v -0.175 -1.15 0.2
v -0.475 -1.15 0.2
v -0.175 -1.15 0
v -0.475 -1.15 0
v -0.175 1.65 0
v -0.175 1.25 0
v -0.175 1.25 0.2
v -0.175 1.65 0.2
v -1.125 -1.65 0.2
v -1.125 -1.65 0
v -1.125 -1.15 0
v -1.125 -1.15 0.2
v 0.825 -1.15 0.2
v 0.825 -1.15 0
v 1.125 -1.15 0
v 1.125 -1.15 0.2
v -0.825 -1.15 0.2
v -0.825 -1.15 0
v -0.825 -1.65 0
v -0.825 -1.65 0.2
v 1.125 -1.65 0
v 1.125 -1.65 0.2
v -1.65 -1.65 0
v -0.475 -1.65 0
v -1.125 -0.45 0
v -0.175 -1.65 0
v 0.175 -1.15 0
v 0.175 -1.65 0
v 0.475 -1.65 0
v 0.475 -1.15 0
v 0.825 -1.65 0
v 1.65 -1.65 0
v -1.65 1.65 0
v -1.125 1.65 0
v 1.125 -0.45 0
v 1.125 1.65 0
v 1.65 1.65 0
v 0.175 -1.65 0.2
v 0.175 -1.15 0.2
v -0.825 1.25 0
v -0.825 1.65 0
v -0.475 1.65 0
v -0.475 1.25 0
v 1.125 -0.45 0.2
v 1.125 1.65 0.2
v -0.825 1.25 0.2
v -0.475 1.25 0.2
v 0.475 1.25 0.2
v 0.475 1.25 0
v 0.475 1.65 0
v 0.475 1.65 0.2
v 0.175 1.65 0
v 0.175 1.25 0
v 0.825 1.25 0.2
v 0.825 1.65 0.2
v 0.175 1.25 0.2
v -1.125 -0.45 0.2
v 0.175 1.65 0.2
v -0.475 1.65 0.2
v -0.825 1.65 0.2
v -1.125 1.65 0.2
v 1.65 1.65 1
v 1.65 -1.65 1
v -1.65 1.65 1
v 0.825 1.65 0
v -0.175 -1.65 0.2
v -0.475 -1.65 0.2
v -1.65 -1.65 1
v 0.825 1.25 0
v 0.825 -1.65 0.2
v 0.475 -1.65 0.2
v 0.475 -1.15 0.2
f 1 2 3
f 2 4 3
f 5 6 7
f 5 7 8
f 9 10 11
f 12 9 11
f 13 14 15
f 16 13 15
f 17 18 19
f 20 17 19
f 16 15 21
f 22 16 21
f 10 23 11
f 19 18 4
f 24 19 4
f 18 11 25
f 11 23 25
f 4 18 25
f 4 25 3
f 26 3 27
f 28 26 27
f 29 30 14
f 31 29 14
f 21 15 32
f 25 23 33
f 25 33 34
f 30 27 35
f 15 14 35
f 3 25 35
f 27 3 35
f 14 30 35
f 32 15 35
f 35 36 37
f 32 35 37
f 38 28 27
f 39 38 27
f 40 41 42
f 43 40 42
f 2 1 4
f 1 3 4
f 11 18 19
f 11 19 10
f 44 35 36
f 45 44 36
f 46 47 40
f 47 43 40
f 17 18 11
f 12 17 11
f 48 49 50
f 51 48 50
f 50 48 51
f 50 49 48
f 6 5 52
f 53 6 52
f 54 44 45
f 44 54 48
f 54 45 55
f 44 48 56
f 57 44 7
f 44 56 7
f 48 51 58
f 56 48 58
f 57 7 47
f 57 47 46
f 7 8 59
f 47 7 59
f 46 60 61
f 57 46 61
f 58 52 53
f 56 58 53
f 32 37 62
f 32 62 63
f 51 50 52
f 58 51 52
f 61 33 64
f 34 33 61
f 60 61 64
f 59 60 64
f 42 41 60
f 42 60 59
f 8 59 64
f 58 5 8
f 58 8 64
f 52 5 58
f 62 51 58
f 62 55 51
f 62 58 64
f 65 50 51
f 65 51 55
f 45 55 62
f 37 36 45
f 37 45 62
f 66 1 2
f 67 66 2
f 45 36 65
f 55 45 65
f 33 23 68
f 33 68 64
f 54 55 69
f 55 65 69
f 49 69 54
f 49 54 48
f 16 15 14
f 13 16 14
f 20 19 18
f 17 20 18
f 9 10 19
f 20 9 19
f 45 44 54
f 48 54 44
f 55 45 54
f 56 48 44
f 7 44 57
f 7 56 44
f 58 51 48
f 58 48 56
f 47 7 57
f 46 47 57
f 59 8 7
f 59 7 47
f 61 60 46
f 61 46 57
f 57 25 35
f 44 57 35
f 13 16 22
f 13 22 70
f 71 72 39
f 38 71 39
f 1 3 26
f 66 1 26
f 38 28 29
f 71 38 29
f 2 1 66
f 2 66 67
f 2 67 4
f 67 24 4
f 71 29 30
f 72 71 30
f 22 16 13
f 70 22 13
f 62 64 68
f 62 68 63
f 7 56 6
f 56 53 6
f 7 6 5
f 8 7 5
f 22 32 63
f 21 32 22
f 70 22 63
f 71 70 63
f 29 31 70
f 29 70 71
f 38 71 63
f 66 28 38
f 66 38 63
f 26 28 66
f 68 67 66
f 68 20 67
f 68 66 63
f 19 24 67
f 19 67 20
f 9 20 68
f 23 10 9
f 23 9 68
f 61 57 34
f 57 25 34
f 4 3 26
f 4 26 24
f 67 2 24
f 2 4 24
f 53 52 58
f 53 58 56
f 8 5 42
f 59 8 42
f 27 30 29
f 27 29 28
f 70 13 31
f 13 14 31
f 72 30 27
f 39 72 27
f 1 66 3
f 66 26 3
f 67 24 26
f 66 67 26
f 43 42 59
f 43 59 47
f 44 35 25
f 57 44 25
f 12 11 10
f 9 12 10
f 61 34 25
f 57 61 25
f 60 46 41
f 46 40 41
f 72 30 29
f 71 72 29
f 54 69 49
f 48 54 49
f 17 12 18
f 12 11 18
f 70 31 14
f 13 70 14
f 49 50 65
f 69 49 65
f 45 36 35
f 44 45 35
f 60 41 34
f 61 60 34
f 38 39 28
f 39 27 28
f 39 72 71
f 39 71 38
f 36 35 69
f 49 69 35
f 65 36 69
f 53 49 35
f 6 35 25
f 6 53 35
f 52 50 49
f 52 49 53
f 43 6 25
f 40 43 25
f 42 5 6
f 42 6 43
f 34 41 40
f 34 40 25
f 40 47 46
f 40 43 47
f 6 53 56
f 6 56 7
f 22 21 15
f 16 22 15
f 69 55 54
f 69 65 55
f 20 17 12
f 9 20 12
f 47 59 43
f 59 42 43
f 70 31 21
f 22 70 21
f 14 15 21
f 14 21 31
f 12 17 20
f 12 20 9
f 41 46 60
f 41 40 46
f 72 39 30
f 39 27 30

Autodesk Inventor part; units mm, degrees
ref_plane "YZ Plane" through (0, 0, 0) normal (1, 0, 0) x (0, 1, 0)
ref_plane "XZ Plane" through (0, 0, 0) normal (0, 1, 0) x (-1, 0, 0)
ref_plane "XY Plane" through (0, 0, 0) normal (0, 0, 1) x (1, 0, 0)
sketch "Sketch1" plane through (0, 0, 0) normal (0, 0, 1) x (1, 0, 0)
  line L0 (1.65, -1.65) -> (-1.65, -1.65)
  line L1 (-1.65, -1.65) -> (-1.65, 1.65)
  line L2 (-1.65, 1.65) -> (1.65, 1.65)
  line L3 (1.65, 1.65) -> (1.65, -1.65)
  line L4 (1.65, -1.65) -> (-1.65, 1.65) construction
  line L5 (-1.65, -1.65) -> (1.65, 1.65) construction
  point P0 (0, 0)
  dimension "d0" = 3.3
  dimension "d1" = 3.3
extrude "Extrusion1" add sketch "Sketch1" along normal blind 1
sketch "Sketch2" plane through (0, 0, 0) normal (0, 0, -1) x (-1, 0, 0)
  line L0 (-1.65, -1.65) -> (1.65, -1.65) projected
  line L1 (1.65, -1.65) -> (1.65, 1.65) projected
  line L2 (1.65, 1.65) -> (-1.65, 1.65) projected
  line L3 (-1.65, 1.65) -> (-1.65, -1.65) projected
  line L4 (-1.125, -1.65) -> (-0.825, -1.65)
  line L5 (-0.825, -1.65) -> (-0.825, -1.15)
  line L6 (-0.825, -1.15) -> (-1.125, -1.15)
  line L7 (-1.125, -1.15) -> (-1.125, -1.65)
  line L8 (1.65, -1.65) -> (-1.65, -1.65) projected
  line L9 (-0.475, -1.65) -> (-0.175, -1.65)
  line L10 (-0.175, -1.65) -> (-0.175, -1.15)
  line L11 (-0.175, -1.15) -> (-0.475, -1.15)
  line L12 (-0.475, -1.15) -> (-0.475, -1.65)
  line L13 (0.175, -1.65) -> (0.475, -1.65)
  line L14 (0.475, -1.65) -> (0.475, -1.15)
  line L15 (0.475, -1.15) -> (0.175, -1.15)
  line L16 (0.175, -1.15) -> (0.175, -1.65)
  line L17 (0.825, -1.65) -> (1.125, -1.65)
  line L18 (1.125, -1.65) -> (1.125, -1.15)
  line L19 (1.125, -1.15) -> (0.825, -1.15)
  line L20 (0.825, -1.15) -> (0.825, -1.65)
  line L21 (1.125, 1.65) -> (-1.125, 1.65)
  line L22 (-1.125, 1.65) -> (-1.125, -0.45)
  line L23 (-1.125, -0.45) -> (1.125, -0.45)
  line L24 (1.125, -0.45) -> (1.125, 1.65)
  line L25 (0.825, 1.65) -> (0.475, 1.65)
  line L26 (0.475, 1.65) -> (0.475, 1.25)
  line L27 (0.475, 1.25) -> (0.825, 1.25)
  line L28 (0.825, 1.25) -> (0.825, 1.65)
  line L29 (0.175, 1.65) -> (-0.175, 1.65)
  line L30 (-0.175, 1.65) -> (-0.175, 1.25)
  line L31 (-0.175, 1.25) -> (0.175, 1.25)
  line L32 (0.175, 1.25) -> (0.175, 1.65)
  line L33 (-1.65, 1.65) -> (1.65, 1.65) projected
  line L34 (-0.475, 1.65) -> (-0.825, 1.65)
  line L35 (-0.825, 1.65) -> (-0.825, 1.25)
  line L36 (-0.825, 1.25) -> (-0.475, 1.25)
  line L37 (-0.475, 1.25) -> (-0.475, 1.65)
  line L38 (0, 1.65) -> (0, 1.25)
  point P0 (0, 0)
  dimension "d4" = 1.7
  dimension "d5" = 0.7
  dimension "d6" = 0.4
  dimension "d7" = 0.3
  dimension "d8" = 0.3
  dimension "d9" = 0.3
  dimension "d10" = 0.3
  dimension "d11" = 0.3
  dimension "d12" = 0.3
  dimension "d13" = 0.3
  dimension "d14" = 0.3
  dimension "d15" = 0.65
  dimension "d16" = 0.65
  dimension "d17" = 0.65
  dimension "d18" = 0.65
  dimension "d19" = 0.65
extrude "Extrusion2" cut sketch "Sketch2" against normal blind 0.2 contours L7 L6 L5 L0 | L2 L35 L36 L37 L30 L31 L32 L26 L27 L28 L24 L23 L22 | L12 L11 L10 L0 | L16 L15 L14 L0 | L20 L19 L18 L0
sketch "Sketch3" plane through (0, 0, 0) normal (0, 0, -1) x (-1, 0, 0)
  line L0 (0.175, 1.25) -> (0.175, 1.65) projected
  line L1 (-0.175, 1.25) -> (0.175, 1.25) projected
  line L2 (-0.175, 1.65) -> (-0.175, 1.25) projected
  line L3 (-0.475, 1.65) -> (-0.175, 1.65) projected
  line L4 (-0.475, 1.25) -> (-0.475, 1.65) projected
  line L5 (-0.825, 1.25) -> (-0.475, 1.25) projected
  line L6 (-0.825, 1.65) -> (-0.825, 1.25) projected
  line L7 (-1.125, 1.65) -> (-0.825, 1.65) projected
  line L8 (-1.125, -0.45) -> (-1.125, 1.65) projected
  line L9 (1.125, -0.45) -> (-1.125, -0.45) projected
  line L10 (1.125, 1.65) -> (1.125, -0.45) projected
  line L11 (0.825, 1.65) -> (1.125, 1.65) projected
  line L12 (0.825, 1.25) -> (0.825, 1.65) projected
  line L13 (0.475, 1.25) -> (0.825, 1.25) projected
  line L14 (0.475, 1.65) -> (0.475, 1.25) projected
  line L15 (0.175, 1.65) -> (0.475, 1.65) projected
  line L16 (-0.825, -1.65) -> (-1.125, -1.65) projected
  line L17 (-0.825, -1.15) -> (-0.825, -1.65) projected
  line L18 (-1.125, -1.15) -> (-0.825, -1.15) projected
  line L19 (-1.125, -1.65) -> (-1.125, -1.15) projected
  line L20 (-0.175, -1.65) -> (-0.475, -1.65) projected
  line L21 (-0.175, -1.15) -> (-0.175, -1.65) projected
  line L22 (-0.475, -1.15) -> (-0.175, -1.15) projected
  line L23 (-0.475, -1.65) -> (-0.475, -1.15) projected
  line L24 (0.475, -1.65) -> (0.175, -1.65) projected
  line L25 (0.475, -1.15) -> (0.475, -1.65) projected
  line L26 (0.175, -1.15) -> (0.475, -1.15) projected
  line L27 (0.175, -1.65) -> (0.175, -1.15) projected
  line L28 (1.125, -1.65) -> (0.825, -1.65) projected
  line L29 (1.125, -1.15) -> (1.125, -1.65) projected
  line L30 (0.825, -1.15) -> (1.125, -1.15) projected
  line L31 (0.825, -1.65) -> (0.825, -1.15) projected
  point P0 (0, 0)
extrude "Extrusion3" add sketch "Sketch3" against normal blind 0.2 separate body
properties part number "S3O8" material "ABS Plastic"
